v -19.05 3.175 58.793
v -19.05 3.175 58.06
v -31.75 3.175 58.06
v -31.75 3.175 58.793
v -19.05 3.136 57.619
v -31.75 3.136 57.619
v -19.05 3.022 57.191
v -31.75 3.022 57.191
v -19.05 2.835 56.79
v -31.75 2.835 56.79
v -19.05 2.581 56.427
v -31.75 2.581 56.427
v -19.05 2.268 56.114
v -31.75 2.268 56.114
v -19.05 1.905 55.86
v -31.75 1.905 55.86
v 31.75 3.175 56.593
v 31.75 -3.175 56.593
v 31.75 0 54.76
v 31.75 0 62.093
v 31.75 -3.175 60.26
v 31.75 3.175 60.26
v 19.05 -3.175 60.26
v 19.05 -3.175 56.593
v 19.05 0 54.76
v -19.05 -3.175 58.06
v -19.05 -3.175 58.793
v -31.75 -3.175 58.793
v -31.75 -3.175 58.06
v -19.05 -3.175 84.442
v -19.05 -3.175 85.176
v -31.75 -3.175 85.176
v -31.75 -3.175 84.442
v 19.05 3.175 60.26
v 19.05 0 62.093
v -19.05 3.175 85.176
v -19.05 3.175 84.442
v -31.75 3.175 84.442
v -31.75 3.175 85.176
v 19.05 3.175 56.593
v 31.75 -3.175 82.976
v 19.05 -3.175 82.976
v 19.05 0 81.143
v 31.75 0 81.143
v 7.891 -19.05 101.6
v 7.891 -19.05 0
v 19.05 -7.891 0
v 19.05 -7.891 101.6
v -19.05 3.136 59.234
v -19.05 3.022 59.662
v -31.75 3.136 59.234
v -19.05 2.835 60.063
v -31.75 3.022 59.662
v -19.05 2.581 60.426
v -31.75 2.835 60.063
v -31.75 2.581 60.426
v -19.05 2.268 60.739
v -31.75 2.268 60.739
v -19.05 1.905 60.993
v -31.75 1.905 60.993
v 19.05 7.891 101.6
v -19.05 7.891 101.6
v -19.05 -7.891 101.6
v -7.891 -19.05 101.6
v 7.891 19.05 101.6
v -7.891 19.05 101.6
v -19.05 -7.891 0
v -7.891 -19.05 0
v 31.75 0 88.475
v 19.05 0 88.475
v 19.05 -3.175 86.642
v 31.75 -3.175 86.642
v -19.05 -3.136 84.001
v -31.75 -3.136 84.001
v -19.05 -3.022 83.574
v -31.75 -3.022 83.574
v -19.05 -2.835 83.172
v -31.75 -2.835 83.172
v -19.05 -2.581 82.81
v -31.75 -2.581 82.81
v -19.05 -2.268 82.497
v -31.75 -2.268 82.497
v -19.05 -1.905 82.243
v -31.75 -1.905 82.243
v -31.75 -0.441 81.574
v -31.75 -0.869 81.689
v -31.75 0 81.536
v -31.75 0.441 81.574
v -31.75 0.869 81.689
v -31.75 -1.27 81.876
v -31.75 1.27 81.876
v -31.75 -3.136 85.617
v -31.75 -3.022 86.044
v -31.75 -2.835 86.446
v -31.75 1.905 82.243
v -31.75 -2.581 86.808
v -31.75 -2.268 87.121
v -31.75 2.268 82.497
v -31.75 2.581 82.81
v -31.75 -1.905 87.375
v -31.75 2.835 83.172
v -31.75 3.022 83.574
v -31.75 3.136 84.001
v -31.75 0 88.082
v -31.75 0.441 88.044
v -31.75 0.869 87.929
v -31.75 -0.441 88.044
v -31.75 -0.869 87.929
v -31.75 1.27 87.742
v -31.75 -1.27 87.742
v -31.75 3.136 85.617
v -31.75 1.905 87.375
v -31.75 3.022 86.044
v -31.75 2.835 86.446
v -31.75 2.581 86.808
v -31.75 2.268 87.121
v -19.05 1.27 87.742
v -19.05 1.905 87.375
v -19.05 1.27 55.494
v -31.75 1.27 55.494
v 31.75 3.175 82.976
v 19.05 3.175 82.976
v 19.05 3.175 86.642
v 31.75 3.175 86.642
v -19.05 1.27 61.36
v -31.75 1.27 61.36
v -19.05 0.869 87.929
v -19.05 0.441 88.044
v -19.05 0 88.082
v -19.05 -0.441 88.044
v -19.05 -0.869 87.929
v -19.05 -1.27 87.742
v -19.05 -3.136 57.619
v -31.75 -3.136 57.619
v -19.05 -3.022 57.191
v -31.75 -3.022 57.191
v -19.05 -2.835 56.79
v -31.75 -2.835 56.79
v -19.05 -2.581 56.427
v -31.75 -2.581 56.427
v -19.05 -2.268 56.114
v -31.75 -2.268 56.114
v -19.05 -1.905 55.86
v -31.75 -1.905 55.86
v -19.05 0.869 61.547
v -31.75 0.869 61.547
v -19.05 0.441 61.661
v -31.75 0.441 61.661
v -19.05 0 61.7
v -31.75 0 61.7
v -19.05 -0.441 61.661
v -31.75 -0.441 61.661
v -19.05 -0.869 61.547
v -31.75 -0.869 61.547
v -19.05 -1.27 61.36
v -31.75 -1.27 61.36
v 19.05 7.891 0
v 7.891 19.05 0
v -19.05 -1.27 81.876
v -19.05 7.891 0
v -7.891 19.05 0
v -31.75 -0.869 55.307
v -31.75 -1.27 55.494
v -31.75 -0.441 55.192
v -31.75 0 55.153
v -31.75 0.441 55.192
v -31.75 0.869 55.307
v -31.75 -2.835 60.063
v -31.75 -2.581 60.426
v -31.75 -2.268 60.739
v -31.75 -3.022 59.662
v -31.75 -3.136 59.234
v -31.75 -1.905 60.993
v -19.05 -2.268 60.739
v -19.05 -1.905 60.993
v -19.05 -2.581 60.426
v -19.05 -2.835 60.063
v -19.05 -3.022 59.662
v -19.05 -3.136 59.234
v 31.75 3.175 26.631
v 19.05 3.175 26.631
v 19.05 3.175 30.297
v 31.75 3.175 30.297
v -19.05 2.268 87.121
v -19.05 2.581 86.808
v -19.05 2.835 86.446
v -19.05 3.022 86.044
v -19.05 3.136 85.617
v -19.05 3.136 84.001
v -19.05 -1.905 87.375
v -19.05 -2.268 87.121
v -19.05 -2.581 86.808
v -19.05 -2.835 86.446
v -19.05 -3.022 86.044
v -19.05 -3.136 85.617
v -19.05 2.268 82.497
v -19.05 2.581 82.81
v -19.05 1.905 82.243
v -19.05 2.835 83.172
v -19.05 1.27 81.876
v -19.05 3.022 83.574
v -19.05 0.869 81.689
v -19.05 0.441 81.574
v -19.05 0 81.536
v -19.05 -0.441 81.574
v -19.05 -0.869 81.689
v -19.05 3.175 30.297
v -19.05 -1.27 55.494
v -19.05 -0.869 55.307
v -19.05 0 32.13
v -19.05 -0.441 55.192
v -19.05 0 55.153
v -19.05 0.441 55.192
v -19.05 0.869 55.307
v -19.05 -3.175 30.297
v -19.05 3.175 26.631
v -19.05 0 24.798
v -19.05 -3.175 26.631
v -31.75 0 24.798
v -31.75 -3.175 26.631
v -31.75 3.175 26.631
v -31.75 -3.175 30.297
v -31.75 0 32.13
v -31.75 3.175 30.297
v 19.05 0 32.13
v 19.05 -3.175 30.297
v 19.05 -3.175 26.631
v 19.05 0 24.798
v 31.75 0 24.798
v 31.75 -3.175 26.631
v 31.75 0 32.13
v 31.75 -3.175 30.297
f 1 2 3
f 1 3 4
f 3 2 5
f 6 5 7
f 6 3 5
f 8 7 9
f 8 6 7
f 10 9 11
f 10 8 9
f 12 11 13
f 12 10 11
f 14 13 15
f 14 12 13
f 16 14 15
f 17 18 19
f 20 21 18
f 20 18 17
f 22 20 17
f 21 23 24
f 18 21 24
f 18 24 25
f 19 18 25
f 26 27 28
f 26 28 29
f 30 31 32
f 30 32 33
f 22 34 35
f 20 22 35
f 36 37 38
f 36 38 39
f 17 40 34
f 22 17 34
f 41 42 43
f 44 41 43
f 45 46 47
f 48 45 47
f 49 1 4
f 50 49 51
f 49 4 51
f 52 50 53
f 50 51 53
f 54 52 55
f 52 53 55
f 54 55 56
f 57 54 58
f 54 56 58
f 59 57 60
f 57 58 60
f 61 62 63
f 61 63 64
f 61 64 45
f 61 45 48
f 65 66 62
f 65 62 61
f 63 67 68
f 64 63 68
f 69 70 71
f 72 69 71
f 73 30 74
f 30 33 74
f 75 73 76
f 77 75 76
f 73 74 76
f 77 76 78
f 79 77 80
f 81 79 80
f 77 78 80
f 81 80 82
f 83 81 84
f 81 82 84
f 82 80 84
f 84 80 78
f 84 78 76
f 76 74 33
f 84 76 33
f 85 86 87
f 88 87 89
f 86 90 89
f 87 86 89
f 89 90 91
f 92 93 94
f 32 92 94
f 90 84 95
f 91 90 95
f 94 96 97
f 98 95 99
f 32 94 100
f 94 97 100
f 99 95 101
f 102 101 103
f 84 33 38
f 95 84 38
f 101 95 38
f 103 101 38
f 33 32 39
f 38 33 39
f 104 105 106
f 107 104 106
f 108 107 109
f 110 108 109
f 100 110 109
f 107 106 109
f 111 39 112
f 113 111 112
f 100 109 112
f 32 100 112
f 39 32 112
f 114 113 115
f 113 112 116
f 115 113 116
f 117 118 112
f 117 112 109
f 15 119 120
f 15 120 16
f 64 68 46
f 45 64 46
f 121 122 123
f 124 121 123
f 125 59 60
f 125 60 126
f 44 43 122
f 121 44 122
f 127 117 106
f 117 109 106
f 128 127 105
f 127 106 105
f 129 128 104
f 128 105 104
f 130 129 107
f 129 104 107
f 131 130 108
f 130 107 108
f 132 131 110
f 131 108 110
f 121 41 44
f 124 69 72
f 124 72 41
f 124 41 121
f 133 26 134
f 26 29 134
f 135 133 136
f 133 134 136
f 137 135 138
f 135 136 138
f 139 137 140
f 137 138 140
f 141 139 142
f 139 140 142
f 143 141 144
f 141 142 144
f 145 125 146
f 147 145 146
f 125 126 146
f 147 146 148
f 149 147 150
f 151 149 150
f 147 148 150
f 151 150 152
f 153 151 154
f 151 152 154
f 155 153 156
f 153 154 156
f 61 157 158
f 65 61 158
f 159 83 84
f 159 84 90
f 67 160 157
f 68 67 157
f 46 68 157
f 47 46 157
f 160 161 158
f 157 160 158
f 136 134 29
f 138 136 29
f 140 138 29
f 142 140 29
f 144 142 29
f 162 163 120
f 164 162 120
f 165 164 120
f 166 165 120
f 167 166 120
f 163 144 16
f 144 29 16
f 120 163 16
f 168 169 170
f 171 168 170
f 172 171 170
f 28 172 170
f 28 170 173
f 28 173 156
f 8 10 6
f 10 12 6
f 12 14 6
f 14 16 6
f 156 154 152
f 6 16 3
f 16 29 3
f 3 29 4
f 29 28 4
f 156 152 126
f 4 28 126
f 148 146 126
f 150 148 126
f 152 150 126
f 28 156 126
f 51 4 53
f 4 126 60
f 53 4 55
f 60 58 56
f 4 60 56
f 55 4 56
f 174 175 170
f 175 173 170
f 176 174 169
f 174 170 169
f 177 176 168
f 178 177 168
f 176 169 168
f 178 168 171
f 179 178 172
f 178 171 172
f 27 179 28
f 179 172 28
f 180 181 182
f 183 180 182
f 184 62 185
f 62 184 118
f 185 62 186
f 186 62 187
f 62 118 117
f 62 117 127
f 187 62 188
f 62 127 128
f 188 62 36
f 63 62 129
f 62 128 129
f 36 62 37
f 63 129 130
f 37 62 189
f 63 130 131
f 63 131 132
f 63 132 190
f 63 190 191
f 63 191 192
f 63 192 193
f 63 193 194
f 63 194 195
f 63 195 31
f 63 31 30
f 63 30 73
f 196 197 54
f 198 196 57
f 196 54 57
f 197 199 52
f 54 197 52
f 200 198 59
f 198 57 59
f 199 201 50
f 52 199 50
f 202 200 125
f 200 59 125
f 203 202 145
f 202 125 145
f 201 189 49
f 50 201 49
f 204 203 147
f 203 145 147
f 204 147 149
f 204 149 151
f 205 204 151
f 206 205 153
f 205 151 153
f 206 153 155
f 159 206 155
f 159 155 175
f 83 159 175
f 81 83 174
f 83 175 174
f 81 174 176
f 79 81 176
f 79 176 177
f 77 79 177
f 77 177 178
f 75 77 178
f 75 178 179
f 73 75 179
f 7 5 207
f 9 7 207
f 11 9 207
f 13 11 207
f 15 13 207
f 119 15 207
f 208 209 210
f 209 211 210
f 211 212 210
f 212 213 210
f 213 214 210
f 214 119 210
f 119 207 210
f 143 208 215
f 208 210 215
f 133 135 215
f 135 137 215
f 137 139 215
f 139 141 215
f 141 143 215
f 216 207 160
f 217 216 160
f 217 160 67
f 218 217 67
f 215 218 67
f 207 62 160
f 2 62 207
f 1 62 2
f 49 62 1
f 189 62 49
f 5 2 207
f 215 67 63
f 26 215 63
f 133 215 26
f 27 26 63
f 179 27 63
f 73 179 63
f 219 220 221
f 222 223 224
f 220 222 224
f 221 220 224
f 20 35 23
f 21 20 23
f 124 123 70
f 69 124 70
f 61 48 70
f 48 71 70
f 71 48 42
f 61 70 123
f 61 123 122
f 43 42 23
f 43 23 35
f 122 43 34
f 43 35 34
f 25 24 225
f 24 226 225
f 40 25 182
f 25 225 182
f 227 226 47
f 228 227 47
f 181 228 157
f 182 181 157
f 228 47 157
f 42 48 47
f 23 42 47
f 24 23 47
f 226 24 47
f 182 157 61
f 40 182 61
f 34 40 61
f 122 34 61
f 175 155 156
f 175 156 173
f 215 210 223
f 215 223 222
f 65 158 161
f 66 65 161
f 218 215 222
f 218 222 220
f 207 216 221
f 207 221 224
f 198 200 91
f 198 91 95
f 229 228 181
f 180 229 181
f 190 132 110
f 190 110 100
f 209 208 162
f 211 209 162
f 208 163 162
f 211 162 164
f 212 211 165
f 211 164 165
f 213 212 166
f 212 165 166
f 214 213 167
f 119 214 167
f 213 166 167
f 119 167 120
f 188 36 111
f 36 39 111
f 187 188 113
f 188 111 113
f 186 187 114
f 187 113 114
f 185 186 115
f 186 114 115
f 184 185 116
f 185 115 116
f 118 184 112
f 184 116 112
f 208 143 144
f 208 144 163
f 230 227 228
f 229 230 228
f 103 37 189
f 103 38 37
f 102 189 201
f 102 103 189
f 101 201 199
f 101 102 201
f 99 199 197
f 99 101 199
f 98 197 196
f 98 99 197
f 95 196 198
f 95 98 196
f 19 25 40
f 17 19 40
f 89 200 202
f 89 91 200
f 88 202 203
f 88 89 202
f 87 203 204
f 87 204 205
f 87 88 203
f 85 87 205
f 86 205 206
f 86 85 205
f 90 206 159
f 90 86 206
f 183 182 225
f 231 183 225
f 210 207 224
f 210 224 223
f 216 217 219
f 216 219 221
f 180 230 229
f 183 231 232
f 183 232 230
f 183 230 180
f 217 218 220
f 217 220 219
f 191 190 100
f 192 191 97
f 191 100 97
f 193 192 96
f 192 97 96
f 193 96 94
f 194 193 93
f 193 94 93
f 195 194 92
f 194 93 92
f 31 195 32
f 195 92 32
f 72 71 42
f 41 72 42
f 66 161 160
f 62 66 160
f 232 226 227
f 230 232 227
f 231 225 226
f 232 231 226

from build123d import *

# Parameters (mm, degrees)
F1_DEPTH      = 101.6
F3_DEPTH      = 12.7
F3_DEPTH_BACK = 50.8
F4_R          = 2.54
F5_R          = 2.54


with BuildPart() as f1:
    # F0 (on Top) → F1 (new body)
    with BuildSketch(Plane.XY):
        Polygon((19.05, -7.8907683632), (19.05, 7.8907683632), (7.8907683632, 19.05), (-7.8907683632, 19.05), (-19.05, 7.8907683632), (-19.05, -7.8907683632), (-7.8907683632, -19.05), (7.8907683632, -19.05), align=None)
    extrude(amount=F1_DEPTH)

    # F2 (on face) → F3 (join, two sides)
    with BuildSketch(Plane.YZ.offset(19.05)) as f3_sk:
        Polygon((3.175, 82.9758370032), (3.175, 86.6420112126), (0, 88.4750983173), (-3.175, 86.6420112126), (-3.175, 82.9758370032), (0, 81.1427498985), align=None)
        Polygon((3.175, 56.5934885845), (3.175, 60.2596627939), (0, 62.0927498985), (-3.175, 60.2596627939), (-3.175, 56.5934885845), (0, 54.7604014798), align=None)
        Polygon((3.175, 26.6308819025), (3.175, 30.2970561118), (0, 32.1301432165), (-3.175, 30.2970561118), (-3.175, 26.6308819025), (0, 24.7977947978), align=None)
    extrude(amount=F3_DEPTH)
    extrude(f3_sk.sketch, amount=-F3_DEPTH_BACK)

    # F4
    f4_edges = [f1.edges().sort_by_distance(p)[0] for p in [
        (-25.4, 3.175, 86.642011),
        (-25.4, 3.175, 82.975837),
        (-25.4, 0, 81.14275),
        (-25.4, -3.175, 82.975837),
        (-25.4, -3.175, 86.642011),
        (-25.4, 0, 88.475098),
    ]]
    fillet(f4_edges, radius=F4_R)

    # F5
    f5_edges = [f1.edges().sort_by_distance(p)[0] for p in [
        (-25.4, 0, 62.09275),
        (-25.4, -3.175, 56.593489),
        (-25.4, 0, 54.760401),
        (-25.4, 3.175, 56.593489),
        (-25.4, 3.175, 60.259663),
        (-25.4, -3.175, 60.259663),
    ]]
    fillet(f5_edges, radius=F5_R)


solid = f1.part
